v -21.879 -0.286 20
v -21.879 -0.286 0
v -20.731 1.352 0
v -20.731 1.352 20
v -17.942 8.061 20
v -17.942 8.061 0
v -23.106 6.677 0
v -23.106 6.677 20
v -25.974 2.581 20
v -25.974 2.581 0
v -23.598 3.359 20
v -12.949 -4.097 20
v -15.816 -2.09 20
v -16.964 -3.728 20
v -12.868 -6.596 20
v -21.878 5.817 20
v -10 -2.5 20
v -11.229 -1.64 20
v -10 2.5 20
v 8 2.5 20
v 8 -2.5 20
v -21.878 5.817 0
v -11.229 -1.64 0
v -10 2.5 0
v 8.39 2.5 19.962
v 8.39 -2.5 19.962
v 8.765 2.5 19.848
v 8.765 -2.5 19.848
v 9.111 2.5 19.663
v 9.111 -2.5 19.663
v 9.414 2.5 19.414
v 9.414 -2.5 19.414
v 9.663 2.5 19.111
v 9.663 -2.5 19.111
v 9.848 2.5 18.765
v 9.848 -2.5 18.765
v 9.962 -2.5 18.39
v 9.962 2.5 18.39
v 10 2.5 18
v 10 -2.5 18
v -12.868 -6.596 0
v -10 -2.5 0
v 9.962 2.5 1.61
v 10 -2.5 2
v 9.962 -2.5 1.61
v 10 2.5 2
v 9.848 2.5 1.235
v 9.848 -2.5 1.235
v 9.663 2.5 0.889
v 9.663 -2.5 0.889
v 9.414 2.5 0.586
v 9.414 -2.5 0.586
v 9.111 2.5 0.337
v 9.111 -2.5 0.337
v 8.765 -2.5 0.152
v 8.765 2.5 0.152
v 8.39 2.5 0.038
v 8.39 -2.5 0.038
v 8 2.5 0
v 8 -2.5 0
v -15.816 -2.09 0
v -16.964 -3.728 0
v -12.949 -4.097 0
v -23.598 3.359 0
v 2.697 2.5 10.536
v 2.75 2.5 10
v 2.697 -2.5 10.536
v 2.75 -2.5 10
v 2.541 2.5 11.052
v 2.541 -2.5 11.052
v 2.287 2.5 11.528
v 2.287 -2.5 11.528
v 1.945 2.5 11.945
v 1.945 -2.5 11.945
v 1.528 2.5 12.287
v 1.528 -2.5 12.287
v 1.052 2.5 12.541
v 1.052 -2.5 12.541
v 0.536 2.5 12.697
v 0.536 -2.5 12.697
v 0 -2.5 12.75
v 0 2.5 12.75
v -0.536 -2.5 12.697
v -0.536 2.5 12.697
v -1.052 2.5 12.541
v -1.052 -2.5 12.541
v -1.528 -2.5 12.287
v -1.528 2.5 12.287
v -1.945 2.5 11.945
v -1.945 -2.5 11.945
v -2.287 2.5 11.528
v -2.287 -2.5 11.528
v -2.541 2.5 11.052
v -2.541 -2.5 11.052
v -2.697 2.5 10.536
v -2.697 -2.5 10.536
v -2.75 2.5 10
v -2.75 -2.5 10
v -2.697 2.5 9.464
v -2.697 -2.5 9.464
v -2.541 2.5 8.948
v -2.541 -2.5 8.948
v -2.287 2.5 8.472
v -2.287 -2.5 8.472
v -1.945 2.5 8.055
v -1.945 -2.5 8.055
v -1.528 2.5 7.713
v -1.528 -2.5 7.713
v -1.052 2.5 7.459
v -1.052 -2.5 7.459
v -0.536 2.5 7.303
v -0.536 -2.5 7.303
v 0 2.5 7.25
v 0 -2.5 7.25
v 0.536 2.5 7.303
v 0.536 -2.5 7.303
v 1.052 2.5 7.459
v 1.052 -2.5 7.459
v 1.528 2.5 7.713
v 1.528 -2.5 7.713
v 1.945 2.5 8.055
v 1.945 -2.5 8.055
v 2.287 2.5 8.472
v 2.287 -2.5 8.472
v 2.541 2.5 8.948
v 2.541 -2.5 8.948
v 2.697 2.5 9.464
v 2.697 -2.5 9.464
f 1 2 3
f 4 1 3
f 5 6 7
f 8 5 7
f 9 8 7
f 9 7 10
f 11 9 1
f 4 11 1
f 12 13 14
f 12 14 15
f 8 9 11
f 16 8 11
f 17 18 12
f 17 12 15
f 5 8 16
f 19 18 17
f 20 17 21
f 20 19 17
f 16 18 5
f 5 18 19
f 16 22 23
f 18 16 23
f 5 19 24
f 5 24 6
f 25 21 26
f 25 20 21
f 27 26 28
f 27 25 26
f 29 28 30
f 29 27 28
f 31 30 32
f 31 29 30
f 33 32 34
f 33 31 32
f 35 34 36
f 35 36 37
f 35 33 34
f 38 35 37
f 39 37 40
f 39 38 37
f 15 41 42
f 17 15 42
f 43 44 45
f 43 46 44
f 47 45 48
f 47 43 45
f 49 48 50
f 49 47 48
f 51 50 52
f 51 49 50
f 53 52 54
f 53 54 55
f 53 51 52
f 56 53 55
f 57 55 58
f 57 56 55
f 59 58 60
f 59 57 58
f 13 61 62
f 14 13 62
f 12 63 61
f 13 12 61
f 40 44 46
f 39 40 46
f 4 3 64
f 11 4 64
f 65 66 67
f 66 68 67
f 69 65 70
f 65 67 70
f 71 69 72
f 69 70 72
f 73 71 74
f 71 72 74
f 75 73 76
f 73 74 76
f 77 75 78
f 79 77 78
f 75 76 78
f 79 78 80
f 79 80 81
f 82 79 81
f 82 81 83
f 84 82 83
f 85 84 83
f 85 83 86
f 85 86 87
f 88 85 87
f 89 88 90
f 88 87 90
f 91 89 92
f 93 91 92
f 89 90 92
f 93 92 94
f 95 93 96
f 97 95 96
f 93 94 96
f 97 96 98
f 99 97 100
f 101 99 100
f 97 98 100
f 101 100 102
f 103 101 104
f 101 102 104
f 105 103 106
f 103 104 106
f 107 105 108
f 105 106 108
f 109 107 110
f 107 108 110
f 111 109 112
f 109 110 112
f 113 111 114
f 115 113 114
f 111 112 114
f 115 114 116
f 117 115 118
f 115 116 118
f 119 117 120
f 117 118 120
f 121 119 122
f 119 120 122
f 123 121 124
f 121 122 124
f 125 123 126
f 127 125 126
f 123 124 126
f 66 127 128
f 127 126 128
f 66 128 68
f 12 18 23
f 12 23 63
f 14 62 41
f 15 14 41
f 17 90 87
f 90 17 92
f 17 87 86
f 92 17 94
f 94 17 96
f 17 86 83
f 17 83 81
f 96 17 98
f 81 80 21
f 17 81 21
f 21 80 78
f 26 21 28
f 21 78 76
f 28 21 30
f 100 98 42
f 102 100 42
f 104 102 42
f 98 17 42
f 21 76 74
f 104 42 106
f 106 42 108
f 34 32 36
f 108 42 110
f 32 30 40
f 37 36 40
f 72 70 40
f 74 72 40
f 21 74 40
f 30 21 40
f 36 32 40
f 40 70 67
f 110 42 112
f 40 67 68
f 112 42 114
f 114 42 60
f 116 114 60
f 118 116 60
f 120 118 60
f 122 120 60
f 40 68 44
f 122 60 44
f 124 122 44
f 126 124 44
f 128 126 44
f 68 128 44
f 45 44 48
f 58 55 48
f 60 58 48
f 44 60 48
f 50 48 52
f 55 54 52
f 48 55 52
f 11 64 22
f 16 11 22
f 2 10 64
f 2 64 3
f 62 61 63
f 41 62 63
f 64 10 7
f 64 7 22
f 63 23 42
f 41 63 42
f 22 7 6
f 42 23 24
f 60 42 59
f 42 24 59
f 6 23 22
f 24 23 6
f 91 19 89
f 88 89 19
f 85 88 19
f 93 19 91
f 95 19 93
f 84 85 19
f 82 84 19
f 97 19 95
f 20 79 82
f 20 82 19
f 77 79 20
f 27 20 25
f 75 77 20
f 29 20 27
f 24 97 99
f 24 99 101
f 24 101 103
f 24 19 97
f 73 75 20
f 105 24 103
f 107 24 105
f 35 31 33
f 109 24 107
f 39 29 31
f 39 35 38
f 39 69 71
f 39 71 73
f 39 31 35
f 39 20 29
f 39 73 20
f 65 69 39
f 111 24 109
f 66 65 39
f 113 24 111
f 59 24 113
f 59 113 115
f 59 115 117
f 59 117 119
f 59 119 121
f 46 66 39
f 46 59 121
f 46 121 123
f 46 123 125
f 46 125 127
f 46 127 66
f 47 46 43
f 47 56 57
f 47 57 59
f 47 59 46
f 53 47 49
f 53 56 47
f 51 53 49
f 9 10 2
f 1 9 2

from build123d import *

# Parameters (mm, degrees)
F0_W      = 20
F0_H      = 5
F1_DEPTH  = 20
F2_R      = 2.75
F3_DEPTH  = 6.3
F3_FACE_R = 2.75
F4_DEPTH  = 6.5967602214
F5_R      = 2


# Not quite as in the source:
# - a feature names something its author has since deleted; it is built from what else it names


with BuildPart() as f1:
    # F0 (on Top) → F1 (new body)
    with BuildSketch(Plane.XY):
        Polygon((-10, -2.5), (-10, 2.5), (-17.9419796384, 8.0610340111), (-23.1064327086, 6.6772229816), (-21.8777046422, 5.8168583271), (-11.2287280664, -1.6396353455), align=None)
        Rectangle(F0_W, F0_H)
        Polygon((-21.8777046422, 5.8168583271), (-23.1064327086, 6.6772229816), (-25.9743148904, 2.5814627602), (-21.8785546689, -0.2864194216), (-20.7314017962, 1.351884667), (-23.5984339512, 3.3594021942), align=None)
        Polygon((-12.8678821818, -6.5957602214), (-10, -2.5), (-11.2287280664, -1.6396353455), (-12.9494573755, -4.0970914783), (-15.8164895305, -2.0895739511), (-16.9636424032, -3.7278780397), align=None)
    extrude(amount=F1_DEPTH)

    # F2 (on Front) → F3 (cut)
    with BuildSketch(Plane.XZ):
        with Locations((0, 10)):
            Circle(F2_R)
    extrude(amount=-F3_DEPTH, mode=Mode.SUBTRACT)

    # F2 (on Front) + F3_face (on face) → F4 (cut, through all)
    with BuildSketch(Plane.XZ):
        with Locations((0, 10)):
            Circle(F2_R)
    with BuildSketch(Plane(origin=(0, 0, 10), x_dir=(-1, 0, 0), z_dir=(0, 1, 0))):
        Circle(F3_FACE_R)
    extrude(amount=F4_DEPTH, dir=(0, -1, 0), mode=Mode.SUBTRACT)

    # F5
    f5_edges = [f1.edges().sort_by_distance(p)[0] for p in [
        (10, 0, 20),
        (10, 0, 0),
    ]]
    fillet(f5_edges, radius=F5_R)


solid = f1.part
